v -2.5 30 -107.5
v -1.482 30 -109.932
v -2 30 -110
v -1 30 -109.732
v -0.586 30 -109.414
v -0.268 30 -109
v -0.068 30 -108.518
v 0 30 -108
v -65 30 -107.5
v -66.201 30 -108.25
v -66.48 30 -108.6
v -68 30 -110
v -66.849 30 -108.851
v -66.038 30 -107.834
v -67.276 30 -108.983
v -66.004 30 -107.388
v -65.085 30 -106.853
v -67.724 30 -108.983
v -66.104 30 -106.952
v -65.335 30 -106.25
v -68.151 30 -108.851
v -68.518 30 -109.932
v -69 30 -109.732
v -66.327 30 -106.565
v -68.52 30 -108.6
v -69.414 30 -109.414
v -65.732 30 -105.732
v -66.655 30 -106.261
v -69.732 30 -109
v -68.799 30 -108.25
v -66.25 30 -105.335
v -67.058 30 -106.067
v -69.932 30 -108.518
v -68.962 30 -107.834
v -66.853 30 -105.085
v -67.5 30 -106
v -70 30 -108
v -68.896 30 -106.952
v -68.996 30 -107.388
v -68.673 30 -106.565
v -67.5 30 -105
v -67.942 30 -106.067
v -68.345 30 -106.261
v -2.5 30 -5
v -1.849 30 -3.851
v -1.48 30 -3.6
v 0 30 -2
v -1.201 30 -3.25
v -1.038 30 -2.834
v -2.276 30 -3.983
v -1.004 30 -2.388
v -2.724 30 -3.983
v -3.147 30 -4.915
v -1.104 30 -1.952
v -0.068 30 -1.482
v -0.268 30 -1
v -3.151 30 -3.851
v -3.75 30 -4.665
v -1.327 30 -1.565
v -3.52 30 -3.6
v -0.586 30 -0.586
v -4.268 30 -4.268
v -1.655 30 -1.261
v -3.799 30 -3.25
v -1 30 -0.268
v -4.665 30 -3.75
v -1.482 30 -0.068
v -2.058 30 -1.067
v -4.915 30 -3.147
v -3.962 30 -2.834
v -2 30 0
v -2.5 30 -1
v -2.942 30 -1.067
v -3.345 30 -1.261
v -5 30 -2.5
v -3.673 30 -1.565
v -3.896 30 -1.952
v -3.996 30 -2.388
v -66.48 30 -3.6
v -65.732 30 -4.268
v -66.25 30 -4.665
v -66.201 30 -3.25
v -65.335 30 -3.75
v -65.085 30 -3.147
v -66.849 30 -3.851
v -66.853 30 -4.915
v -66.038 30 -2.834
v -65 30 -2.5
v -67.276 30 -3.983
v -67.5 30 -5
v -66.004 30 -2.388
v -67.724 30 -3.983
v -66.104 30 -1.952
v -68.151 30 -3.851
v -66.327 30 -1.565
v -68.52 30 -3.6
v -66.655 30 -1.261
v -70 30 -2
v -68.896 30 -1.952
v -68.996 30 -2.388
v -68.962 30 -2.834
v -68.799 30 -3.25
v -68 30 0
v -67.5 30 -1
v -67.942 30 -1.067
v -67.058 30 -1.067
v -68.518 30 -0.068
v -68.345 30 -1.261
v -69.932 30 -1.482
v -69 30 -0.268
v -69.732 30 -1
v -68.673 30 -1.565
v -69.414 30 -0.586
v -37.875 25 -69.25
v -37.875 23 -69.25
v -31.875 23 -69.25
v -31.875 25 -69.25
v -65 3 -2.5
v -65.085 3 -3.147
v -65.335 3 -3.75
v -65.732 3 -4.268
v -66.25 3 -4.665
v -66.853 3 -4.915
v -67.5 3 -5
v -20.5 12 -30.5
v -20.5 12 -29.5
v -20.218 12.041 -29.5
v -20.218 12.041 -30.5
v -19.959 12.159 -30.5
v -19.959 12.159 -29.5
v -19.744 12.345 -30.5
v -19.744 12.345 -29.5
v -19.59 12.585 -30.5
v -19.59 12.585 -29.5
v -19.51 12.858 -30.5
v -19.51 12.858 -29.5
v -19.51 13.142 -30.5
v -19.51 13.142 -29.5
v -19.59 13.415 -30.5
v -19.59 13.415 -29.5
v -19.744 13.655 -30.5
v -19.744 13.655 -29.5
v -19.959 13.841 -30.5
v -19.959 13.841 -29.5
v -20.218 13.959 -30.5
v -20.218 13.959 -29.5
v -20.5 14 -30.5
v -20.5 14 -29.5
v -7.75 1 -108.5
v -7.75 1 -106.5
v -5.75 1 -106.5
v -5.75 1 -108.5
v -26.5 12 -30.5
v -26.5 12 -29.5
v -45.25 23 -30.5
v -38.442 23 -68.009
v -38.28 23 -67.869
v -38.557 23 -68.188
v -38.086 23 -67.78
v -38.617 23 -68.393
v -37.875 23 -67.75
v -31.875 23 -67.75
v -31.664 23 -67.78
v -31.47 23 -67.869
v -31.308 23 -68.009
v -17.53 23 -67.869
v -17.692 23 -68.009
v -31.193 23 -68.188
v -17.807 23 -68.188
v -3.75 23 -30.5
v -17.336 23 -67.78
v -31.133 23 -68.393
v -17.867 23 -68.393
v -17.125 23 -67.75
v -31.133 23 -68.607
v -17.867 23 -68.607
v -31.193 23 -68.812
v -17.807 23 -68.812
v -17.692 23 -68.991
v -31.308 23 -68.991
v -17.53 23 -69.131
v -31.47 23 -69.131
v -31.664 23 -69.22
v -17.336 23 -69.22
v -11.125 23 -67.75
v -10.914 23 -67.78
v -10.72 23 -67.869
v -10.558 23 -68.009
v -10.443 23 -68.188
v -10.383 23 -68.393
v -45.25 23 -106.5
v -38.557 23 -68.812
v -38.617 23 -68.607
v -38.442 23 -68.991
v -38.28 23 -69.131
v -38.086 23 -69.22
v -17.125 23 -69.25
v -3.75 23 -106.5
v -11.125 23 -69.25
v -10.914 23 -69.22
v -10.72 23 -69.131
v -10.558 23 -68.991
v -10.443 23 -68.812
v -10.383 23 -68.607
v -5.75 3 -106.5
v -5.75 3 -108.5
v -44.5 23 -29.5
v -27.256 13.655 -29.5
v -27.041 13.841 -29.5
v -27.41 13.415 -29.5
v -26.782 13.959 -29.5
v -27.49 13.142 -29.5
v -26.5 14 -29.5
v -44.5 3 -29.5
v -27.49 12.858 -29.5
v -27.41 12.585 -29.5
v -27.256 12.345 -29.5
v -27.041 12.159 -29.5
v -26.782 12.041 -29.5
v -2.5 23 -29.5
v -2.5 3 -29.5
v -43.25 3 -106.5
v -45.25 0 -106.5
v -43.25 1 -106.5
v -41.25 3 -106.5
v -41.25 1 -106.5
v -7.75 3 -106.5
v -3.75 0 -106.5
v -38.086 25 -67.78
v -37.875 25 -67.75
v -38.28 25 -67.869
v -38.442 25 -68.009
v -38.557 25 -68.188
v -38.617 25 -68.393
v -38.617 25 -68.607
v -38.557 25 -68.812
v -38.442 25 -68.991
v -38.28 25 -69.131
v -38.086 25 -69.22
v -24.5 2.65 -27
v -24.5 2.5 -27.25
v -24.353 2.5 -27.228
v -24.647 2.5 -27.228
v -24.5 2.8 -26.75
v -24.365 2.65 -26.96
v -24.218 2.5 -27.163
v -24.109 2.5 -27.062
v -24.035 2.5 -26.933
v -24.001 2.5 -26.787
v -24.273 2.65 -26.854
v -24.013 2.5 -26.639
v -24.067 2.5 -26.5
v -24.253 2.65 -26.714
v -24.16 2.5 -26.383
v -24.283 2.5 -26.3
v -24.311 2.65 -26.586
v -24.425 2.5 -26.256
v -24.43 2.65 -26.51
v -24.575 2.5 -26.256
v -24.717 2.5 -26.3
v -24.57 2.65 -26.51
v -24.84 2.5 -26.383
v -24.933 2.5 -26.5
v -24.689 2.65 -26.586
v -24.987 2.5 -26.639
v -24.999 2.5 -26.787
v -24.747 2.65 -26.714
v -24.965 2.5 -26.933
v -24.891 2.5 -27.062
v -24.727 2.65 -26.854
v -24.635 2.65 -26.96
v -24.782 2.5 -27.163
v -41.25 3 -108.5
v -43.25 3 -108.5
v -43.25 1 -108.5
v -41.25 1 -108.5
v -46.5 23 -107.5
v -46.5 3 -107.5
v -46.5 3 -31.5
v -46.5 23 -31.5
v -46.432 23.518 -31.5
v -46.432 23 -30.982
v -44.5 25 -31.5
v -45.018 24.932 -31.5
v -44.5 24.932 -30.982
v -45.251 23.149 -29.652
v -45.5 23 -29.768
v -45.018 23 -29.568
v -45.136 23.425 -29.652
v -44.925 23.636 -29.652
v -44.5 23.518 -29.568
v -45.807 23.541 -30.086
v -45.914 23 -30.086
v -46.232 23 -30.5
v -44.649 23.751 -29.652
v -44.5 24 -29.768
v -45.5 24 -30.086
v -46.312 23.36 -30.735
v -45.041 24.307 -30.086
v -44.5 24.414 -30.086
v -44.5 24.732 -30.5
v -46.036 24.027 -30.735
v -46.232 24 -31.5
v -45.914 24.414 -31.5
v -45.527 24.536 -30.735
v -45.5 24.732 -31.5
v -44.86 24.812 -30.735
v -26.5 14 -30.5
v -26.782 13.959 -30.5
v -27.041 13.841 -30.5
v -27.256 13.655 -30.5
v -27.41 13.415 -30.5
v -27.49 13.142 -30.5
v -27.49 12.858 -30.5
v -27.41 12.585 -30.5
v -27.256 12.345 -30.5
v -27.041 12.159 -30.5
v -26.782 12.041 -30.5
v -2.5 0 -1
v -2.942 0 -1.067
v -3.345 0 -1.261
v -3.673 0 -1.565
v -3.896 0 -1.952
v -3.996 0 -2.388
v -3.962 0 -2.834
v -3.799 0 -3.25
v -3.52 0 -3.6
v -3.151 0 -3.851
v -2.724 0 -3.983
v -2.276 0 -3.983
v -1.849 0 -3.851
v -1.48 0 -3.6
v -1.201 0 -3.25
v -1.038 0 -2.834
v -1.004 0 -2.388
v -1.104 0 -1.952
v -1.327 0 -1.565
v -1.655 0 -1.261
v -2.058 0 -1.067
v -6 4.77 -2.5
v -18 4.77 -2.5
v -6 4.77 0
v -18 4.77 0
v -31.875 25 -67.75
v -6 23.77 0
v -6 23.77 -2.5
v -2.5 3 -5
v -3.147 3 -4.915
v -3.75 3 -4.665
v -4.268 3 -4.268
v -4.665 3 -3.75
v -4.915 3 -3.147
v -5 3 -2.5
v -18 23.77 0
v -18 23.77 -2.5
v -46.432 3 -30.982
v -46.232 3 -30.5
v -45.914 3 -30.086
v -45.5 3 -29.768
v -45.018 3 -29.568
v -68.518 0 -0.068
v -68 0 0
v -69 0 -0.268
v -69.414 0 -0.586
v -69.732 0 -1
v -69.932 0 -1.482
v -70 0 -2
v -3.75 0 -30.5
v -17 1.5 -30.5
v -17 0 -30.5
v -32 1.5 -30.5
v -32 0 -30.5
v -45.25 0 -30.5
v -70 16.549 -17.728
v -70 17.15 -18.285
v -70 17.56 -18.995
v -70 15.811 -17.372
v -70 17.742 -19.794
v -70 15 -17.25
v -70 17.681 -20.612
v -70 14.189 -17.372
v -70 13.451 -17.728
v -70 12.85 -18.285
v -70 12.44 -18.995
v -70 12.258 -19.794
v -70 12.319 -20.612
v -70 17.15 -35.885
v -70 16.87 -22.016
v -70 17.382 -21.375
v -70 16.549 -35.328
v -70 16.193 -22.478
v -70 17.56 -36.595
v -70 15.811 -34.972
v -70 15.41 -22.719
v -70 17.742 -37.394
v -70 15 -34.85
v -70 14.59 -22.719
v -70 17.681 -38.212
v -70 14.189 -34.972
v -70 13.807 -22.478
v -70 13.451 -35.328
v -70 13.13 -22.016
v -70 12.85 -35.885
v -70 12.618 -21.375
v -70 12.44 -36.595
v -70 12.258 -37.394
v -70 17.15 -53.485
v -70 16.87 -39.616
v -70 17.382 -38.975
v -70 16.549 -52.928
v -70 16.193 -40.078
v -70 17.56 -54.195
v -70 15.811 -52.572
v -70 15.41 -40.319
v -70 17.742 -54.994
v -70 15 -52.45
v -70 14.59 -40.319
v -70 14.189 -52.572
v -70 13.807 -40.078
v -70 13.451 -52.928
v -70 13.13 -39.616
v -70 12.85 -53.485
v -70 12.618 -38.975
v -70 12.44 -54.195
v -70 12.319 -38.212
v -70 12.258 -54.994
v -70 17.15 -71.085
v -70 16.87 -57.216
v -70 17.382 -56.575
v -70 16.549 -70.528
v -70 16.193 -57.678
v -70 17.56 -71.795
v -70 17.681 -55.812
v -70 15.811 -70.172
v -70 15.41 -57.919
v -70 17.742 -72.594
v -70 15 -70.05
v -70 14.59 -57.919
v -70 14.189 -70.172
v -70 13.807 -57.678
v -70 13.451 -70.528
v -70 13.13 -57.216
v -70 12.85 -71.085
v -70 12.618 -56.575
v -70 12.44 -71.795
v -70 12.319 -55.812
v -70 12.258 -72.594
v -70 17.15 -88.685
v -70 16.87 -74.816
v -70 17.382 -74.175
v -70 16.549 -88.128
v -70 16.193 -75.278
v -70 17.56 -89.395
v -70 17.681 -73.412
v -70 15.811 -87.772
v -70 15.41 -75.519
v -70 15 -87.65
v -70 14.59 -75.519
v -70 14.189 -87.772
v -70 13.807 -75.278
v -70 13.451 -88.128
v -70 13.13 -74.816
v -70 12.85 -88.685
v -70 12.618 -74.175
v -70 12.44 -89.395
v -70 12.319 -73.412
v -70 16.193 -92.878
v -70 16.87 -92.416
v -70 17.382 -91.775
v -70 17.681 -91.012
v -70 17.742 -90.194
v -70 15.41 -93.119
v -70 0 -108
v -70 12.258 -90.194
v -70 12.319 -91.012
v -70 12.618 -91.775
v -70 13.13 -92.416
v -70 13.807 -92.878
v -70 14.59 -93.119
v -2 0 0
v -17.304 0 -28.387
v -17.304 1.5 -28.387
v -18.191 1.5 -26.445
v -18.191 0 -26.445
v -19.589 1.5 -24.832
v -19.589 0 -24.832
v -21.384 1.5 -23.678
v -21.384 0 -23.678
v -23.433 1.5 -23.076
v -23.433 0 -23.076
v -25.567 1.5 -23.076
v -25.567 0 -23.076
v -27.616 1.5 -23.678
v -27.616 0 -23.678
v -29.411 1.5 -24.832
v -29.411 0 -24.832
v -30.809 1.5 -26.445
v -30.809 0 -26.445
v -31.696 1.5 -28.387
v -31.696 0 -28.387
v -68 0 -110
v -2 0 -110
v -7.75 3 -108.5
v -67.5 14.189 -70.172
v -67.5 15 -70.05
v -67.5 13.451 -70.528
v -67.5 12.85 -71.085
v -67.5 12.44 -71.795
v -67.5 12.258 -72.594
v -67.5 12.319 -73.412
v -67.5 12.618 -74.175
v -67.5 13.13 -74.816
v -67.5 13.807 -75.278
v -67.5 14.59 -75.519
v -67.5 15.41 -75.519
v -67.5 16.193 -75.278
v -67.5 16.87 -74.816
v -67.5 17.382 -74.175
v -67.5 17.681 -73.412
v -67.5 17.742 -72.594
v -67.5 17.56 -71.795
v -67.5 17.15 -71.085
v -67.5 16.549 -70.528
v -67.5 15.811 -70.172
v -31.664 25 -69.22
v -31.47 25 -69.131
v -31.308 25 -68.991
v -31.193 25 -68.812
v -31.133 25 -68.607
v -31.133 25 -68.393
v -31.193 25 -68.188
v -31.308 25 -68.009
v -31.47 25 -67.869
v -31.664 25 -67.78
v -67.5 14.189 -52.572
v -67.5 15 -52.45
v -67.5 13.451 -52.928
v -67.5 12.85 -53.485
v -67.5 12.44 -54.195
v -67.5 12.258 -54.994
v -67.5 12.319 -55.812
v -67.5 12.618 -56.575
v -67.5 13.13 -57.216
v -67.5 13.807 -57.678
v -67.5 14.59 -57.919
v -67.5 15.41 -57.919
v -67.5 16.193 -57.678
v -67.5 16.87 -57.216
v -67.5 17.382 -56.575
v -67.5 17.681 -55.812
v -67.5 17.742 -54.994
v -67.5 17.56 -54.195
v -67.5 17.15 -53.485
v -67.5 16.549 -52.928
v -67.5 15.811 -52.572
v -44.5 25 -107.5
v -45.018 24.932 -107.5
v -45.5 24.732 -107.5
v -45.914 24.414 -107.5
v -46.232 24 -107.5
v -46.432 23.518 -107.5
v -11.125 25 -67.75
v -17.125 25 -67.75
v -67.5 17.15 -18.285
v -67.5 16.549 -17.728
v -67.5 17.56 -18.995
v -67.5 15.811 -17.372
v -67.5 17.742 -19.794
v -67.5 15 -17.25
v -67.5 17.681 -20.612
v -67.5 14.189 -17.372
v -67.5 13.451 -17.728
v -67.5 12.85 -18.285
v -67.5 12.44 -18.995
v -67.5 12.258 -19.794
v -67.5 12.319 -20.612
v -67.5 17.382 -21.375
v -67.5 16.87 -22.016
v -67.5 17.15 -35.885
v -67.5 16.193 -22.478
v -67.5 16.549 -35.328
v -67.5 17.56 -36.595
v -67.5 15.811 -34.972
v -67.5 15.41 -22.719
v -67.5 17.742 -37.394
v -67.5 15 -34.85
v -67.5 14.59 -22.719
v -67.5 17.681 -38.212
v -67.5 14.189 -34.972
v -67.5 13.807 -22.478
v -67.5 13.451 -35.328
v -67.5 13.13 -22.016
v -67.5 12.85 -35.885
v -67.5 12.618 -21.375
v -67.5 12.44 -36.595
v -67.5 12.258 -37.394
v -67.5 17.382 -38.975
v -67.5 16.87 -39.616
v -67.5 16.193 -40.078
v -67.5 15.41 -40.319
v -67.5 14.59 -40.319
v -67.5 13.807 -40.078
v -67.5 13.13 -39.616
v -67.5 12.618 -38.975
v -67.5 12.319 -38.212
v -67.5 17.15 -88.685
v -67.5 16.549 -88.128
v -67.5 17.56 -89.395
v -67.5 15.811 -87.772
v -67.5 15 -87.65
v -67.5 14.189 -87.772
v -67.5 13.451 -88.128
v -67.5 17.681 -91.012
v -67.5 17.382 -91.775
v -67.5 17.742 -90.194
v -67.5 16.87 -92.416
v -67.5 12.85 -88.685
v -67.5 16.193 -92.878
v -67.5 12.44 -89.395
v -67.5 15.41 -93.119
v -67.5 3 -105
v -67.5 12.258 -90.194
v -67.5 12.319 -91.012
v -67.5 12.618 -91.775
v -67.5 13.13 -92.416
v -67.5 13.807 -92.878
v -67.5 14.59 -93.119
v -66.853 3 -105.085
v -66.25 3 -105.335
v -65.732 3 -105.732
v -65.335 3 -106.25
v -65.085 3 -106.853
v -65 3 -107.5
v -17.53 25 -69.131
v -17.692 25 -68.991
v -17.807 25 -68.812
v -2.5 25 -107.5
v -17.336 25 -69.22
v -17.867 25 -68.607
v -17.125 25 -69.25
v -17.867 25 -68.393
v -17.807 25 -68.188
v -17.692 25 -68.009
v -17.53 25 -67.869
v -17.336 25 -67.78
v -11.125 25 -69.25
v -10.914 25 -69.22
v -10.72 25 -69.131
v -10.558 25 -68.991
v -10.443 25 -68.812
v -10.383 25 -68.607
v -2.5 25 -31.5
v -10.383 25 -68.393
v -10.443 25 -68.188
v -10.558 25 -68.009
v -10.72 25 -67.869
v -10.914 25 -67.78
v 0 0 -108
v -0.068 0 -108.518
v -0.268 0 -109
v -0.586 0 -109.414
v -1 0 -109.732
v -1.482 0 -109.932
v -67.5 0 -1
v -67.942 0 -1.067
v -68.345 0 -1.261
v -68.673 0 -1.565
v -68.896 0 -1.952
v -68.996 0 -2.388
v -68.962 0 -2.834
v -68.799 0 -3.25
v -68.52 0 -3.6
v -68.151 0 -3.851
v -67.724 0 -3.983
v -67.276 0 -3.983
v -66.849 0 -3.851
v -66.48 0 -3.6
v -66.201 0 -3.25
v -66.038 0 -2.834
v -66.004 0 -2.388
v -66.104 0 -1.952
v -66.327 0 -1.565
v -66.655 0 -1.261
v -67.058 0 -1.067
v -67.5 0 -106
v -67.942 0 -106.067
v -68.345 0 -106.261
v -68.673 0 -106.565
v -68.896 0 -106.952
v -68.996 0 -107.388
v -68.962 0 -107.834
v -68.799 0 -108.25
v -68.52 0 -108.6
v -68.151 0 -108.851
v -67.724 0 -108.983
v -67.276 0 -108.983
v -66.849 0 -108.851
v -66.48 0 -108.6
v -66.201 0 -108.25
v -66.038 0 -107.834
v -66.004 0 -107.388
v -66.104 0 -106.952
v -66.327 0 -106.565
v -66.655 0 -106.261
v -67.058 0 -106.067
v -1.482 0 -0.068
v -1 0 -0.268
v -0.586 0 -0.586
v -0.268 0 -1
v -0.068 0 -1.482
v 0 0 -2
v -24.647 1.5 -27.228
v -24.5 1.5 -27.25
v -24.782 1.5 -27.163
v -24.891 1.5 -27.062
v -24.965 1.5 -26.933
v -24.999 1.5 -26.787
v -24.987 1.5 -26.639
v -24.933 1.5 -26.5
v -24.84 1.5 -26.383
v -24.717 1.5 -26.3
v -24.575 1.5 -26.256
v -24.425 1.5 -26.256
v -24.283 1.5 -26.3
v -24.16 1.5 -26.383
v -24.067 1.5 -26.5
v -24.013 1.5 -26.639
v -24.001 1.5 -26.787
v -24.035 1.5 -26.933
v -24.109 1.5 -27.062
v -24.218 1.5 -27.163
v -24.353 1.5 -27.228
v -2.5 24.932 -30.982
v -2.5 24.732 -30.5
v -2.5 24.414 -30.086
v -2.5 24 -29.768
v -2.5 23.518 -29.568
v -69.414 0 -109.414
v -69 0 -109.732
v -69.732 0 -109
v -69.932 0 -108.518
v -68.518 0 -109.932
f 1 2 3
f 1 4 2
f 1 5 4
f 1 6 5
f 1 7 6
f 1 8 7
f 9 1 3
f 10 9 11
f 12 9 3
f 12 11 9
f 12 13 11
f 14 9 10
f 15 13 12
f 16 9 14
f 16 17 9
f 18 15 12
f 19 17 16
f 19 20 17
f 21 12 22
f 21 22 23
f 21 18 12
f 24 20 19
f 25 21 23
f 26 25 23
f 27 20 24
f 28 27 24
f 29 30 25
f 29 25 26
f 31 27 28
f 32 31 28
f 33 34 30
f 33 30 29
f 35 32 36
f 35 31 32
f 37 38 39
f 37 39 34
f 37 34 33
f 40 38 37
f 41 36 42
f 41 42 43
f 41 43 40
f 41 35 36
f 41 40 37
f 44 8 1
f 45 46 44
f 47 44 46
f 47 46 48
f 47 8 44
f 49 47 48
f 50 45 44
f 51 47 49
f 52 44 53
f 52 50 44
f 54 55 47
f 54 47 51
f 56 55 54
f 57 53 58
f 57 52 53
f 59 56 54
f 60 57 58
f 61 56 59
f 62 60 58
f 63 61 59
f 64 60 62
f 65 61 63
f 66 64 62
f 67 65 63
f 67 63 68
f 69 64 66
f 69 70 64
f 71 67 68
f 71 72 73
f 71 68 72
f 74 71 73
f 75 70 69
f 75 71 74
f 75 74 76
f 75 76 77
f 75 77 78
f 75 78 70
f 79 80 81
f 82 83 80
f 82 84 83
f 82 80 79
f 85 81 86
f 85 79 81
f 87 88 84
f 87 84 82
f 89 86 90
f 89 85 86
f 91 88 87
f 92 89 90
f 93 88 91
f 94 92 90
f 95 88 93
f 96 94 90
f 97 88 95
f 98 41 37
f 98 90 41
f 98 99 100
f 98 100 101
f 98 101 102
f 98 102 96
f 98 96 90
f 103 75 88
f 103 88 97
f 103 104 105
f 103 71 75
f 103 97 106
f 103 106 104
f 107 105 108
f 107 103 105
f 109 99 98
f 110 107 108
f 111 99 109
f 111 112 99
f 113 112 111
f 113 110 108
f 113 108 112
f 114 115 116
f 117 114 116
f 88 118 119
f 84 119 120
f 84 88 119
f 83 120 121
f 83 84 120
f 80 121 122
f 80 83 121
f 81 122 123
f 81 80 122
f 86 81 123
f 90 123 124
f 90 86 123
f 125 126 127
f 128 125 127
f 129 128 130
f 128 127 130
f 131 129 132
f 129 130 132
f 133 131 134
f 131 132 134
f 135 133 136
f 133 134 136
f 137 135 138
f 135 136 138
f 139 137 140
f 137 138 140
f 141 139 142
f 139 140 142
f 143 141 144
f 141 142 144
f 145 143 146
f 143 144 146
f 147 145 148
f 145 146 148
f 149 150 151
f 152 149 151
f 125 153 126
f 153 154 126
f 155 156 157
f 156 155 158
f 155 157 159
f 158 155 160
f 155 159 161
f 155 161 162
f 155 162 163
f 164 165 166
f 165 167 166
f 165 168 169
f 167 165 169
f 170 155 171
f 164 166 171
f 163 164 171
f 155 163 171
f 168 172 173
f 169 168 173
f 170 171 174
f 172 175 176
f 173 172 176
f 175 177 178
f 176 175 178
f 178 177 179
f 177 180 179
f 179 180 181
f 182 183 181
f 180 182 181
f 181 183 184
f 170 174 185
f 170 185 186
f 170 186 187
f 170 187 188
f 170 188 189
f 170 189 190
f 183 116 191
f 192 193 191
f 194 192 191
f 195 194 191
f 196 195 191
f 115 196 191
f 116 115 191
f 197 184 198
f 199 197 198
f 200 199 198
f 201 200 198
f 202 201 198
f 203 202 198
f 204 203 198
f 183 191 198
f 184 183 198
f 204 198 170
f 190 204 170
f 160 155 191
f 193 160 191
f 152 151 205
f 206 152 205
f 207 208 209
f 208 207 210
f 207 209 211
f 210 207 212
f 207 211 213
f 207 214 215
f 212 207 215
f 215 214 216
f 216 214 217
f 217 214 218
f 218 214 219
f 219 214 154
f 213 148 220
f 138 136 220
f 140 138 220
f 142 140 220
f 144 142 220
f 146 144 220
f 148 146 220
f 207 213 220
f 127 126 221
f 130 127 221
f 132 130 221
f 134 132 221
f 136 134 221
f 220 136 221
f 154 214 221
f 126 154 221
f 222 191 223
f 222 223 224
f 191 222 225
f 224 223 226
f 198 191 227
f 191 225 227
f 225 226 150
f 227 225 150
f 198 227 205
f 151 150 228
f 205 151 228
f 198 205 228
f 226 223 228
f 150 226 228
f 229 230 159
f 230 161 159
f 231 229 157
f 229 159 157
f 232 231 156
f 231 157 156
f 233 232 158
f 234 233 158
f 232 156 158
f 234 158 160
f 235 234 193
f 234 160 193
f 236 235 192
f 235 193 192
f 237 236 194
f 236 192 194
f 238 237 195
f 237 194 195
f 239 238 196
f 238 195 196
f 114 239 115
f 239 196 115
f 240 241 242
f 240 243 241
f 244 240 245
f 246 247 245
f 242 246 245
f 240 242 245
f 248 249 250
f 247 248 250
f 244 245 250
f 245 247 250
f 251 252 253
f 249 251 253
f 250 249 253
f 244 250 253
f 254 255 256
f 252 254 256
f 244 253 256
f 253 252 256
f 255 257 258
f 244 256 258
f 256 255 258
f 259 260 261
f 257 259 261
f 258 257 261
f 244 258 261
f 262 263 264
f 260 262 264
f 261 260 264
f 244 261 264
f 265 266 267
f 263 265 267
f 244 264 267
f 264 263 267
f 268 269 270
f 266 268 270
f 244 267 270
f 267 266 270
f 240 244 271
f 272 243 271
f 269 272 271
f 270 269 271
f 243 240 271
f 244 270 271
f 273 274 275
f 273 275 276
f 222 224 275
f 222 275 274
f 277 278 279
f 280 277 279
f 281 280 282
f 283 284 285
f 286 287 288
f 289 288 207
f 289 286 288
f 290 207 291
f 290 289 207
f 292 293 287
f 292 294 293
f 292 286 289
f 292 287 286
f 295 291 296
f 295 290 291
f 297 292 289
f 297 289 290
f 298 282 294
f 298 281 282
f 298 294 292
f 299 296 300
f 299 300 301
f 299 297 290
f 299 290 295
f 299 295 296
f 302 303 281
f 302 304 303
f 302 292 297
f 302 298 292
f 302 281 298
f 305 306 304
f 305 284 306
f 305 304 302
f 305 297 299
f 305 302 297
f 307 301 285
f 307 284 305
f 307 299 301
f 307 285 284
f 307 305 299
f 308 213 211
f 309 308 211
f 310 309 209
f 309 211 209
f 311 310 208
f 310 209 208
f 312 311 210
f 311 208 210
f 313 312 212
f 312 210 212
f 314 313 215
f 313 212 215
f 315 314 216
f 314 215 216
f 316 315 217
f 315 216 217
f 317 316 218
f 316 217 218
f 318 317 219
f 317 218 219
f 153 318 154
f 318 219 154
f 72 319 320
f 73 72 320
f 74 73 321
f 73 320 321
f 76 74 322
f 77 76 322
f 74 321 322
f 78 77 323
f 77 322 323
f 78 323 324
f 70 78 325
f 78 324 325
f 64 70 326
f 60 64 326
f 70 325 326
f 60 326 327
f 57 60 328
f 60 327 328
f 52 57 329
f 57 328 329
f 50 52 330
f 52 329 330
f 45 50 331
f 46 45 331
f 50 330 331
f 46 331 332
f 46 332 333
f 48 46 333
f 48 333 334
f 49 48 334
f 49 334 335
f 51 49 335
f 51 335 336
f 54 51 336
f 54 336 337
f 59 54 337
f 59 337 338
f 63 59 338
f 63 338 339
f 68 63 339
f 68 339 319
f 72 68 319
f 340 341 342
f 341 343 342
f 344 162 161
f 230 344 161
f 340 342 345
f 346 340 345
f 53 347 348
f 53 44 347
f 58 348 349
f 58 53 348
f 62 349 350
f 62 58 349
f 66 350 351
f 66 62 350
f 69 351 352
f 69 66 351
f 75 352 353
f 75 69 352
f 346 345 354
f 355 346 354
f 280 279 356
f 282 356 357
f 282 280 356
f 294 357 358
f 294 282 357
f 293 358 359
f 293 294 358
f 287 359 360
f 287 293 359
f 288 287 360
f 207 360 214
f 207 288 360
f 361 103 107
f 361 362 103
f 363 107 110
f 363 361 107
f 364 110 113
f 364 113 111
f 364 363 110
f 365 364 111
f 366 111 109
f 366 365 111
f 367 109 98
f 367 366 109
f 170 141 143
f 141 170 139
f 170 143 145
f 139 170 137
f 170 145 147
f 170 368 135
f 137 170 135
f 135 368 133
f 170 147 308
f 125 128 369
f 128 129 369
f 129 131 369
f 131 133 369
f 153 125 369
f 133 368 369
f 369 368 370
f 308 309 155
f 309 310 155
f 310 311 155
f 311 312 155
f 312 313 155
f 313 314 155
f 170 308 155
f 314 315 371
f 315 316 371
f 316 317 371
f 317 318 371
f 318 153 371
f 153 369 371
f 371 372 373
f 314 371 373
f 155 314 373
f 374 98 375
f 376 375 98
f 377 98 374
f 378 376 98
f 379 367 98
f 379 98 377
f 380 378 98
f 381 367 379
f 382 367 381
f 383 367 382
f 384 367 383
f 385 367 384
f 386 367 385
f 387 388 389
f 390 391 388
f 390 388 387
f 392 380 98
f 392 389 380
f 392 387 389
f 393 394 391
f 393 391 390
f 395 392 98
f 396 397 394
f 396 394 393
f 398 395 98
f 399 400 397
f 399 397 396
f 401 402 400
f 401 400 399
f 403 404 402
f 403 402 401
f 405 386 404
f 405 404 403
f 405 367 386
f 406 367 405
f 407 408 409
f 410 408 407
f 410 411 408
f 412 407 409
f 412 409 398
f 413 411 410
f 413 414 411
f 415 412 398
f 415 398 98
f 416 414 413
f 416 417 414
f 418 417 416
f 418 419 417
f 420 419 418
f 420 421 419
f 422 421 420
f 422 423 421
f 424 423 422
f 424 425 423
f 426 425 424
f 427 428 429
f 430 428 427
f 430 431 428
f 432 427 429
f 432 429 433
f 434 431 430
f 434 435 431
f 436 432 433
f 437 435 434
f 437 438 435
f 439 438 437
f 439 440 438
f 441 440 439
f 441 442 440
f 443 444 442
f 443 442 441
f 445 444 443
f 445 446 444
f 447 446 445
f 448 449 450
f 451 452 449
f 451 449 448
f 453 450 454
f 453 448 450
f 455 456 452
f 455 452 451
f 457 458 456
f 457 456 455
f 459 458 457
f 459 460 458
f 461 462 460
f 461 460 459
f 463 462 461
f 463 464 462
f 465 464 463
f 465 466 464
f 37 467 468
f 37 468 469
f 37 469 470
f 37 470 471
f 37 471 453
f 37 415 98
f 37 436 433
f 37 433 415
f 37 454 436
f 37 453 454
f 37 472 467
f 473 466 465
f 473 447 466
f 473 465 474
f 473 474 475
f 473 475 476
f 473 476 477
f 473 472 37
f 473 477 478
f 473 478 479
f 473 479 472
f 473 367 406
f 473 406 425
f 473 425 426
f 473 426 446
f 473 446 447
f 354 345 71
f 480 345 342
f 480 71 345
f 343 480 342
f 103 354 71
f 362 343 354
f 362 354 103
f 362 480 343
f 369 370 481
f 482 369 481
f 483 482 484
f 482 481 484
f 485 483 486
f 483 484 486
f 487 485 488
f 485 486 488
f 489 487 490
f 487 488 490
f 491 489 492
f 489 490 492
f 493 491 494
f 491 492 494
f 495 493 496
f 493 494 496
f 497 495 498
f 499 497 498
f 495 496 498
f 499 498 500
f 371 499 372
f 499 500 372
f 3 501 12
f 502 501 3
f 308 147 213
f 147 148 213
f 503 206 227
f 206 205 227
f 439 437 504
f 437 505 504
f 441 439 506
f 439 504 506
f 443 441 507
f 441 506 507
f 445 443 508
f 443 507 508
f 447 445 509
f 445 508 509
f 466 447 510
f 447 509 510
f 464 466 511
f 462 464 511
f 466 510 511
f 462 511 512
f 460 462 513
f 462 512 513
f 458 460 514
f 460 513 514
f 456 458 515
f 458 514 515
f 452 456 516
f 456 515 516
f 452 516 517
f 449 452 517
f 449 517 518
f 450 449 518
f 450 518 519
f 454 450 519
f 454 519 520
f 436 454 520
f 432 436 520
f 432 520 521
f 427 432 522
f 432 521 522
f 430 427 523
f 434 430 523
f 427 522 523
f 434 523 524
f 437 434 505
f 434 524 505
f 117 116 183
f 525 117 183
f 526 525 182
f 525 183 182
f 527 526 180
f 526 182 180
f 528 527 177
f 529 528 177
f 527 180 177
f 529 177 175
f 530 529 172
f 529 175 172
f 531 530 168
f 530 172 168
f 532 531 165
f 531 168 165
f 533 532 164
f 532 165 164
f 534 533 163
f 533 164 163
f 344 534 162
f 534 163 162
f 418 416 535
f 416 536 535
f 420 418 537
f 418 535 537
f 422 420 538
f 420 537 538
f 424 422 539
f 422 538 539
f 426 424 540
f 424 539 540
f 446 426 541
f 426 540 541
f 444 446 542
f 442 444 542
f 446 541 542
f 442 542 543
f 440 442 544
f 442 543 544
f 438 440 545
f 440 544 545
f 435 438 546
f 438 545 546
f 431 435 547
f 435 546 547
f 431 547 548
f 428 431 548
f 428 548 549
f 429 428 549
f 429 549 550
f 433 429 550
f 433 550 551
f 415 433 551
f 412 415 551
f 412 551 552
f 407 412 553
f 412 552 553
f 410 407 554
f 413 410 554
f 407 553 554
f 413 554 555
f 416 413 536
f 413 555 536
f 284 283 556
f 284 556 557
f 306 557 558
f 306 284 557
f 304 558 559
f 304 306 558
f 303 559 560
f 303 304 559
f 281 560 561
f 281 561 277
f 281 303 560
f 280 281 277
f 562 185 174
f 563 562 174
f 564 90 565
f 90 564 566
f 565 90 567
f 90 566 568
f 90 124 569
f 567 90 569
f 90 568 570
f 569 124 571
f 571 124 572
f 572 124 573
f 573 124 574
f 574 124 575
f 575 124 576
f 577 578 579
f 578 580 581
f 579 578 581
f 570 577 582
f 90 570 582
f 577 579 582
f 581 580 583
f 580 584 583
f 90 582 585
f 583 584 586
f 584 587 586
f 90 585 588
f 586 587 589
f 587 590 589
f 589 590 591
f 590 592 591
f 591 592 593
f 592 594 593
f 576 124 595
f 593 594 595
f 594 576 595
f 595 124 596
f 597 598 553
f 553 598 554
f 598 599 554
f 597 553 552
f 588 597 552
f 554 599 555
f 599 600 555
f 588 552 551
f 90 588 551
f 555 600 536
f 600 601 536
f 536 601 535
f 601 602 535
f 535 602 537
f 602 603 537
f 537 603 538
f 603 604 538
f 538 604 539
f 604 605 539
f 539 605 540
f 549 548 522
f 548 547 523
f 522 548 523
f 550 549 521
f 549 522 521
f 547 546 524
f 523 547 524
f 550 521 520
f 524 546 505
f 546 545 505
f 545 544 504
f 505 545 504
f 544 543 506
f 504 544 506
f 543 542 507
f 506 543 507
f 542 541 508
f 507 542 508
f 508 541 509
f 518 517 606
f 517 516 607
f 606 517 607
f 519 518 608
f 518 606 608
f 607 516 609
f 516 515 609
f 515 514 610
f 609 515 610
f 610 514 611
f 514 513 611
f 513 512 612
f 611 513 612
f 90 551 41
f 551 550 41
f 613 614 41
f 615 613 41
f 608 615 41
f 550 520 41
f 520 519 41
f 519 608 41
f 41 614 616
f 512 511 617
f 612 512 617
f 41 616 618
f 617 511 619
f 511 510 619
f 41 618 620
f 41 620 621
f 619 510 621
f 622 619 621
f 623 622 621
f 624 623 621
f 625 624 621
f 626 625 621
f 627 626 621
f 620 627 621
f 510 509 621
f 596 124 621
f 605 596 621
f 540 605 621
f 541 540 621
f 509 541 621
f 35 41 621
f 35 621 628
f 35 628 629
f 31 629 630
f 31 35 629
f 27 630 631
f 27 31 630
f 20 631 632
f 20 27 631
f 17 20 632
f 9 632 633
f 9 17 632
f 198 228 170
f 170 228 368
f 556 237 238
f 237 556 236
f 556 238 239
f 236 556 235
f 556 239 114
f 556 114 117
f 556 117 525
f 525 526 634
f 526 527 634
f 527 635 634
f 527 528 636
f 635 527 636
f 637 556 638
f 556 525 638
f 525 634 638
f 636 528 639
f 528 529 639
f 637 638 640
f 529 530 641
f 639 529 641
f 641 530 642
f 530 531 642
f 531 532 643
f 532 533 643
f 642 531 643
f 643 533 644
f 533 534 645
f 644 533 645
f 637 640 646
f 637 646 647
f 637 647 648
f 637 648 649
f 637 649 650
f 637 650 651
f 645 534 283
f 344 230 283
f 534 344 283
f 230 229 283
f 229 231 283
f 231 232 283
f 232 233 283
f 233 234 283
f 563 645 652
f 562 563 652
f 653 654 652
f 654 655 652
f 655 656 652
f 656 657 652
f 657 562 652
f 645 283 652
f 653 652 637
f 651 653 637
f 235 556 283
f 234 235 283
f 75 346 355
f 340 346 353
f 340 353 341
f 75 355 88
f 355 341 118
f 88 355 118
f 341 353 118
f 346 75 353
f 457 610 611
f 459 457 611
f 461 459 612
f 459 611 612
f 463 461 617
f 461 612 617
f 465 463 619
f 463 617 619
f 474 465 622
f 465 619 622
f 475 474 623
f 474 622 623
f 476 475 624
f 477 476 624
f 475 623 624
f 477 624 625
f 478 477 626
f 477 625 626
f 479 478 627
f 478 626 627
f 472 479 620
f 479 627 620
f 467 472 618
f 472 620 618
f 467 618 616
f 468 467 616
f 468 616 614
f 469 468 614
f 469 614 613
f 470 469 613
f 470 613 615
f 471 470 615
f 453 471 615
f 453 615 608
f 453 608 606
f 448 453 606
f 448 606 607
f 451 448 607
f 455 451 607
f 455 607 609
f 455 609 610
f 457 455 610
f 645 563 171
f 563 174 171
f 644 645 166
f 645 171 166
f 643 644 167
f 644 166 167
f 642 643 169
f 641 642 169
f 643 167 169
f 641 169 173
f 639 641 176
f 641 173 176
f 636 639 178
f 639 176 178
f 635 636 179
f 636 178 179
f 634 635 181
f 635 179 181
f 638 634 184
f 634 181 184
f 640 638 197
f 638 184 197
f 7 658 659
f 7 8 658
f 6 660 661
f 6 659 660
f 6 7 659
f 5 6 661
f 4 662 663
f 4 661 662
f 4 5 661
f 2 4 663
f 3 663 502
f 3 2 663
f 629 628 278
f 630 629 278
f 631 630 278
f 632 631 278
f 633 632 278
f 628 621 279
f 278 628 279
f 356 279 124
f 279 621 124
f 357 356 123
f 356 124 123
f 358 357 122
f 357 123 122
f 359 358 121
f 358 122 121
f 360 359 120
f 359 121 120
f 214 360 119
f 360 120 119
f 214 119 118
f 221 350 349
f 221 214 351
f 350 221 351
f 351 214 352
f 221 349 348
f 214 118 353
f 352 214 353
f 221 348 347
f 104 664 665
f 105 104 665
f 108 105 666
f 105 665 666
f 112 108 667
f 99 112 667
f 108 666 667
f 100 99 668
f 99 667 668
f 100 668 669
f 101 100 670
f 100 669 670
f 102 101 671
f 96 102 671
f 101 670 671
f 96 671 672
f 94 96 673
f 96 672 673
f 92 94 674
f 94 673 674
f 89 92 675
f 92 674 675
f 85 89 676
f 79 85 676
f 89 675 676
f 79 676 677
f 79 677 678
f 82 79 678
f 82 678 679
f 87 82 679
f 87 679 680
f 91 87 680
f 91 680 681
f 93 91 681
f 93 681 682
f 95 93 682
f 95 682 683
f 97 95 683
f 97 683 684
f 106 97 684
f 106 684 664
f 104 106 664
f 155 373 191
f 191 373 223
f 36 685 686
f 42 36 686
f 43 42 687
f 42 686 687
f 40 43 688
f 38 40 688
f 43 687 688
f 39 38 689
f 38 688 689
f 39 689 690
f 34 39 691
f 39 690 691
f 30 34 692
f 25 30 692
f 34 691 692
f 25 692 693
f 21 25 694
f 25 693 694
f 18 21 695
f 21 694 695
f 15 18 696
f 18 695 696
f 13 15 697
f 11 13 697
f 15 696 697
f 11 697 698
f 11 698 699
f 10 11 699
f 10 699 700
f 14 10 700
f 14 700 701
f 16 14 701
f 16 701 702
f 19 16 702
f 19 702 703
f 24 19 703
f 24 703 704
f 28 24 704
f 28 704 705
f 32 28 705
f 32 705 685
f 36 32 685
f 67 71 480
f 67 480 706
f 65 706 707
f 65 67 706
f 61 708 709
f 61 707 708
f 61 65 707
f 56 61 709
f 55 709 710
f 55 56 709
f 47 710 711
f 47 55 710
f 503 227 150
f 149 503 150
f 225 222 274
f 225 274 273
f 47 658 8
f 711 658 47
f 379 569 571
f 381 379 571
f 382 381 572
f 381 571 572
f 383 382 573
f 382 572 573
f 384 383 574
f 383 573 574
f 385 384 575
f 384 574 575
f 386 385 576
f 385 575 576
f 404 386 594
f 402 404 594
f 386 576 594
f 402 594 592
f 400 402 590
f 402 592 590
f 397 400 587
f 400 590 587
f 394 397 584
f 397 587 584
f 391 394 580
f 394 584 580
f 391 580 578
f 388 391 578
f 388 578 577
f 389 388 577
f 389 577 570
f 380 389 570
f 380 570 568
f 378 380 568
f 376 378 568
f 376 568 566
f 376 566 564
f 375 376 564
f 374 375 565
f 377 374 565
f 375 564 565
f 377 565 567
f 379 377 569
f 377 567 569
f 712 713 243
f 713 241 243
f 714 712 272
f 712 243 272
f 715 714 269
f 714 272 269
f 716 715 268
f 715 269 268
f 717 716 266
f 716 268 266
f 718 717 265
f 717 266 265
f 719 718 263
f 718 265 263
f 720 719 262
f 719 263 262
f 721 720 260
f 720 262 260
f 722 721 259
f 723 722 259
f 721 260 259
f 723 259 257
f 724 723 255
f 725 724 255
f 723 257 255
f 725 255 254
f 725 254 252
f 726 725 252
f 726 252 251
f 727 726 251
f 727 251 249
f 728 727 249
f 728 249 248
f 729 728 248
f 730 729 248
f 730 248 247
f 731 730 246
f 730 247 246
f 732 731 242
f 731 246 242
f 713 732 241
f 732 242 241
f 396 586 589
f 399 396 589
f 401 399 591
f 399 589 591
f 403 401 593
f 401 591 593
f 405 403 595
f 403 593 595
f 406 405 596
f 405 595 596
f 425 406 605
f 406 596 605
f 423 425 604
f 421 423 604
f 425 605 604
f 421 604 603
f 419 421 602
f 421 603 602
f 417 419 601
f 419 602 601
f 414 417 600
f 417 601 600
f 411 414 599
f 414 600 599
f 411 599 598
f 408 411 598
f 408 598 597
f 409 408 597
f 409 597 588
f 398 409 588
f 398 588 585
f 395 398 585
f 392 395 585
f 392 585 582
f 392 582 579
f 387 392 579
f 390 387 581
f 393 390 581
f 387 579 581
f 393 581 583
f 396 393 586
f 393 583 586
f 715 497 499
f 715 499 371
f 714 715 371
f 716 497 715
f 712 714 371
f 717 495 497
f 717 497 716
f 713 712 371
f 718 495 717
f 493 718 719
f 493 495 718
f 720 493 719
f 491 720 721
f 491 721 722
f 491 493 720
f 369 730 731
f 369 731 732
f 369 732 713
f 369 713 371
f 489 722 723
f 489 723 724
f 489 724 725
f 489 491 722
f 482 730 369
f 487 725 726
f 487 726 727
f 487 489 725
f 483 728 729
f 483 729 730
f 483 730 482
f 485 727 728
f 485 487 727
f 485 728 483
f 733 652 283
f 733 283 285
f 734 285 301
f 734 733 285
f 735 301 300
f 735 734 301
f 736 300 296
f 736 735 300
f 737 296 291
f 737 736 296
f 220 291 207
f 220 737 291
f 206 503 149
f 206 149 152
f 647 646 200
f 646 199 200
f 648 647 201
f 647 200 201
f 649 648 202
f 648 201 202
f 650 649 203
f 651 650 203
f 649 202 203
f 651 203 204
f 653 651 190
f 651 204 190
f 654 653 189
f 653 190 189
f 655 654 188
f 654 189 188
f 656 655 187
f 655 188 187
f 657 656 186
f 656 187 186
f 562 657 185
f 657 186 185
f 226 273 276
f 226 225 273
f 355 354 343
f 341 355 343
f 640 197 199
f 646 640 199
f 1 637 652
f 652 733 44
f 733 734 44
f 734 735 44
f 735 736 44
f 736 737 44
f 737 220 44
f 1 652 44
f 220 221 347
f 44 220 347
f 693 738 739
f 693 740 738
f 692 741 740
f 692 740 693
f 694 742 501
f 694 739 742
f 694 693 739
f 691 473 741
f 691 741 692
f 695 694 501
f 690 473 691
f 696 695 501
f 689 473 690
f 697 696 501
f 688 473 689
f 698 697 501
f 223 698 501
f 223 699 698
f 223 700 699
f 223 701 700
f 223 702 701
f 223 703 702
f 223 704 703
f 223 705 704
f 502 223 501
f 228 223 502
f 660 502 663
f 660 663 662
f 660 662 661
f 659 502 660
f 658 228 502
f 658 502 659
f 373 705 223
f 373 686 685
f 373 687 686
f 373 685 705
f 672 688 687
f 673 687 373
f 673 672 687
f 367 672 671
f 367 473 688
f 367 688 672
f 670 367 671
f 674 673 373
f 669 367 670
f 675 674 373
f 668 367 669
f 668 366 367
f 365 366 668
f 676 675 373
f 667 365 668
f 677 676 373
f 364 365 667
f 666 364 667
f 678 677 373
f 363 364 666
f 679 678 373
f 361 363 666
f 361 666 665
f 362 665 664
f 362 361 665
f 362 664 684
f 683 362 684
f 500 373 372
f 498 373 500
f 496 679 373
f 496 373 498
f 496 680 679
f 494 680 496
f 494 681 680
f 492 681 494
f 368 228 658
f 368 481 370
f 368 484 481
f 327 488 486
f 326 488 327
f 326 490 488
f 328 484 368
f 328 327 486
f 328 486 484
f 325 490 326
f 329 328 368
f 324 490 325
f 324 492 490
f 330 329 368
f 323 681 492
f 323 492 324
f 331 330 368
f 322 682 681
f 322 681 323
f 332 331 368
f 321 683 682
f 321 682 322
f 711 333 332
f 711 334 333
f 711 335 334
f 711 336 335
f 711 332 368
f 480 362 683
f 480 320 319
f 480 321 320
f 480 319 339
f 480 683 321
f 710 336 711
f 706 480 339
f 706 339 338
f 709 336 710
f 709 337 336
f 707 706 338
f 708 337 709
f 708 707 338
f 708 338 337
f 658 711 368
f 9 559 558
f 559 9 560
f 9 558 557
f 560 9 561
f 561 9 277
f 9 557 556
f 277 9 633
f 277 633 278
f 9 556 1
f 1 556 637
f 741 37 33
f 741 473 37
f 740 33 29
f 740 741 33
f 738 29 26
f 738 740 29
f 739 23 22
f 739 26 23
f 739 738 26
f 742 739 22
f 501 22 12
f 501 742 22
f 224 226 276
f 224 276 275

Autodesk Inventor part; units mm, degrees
ref_plane "YZ Plane" through (0, 0, 0) normal (1, 0, 0) x (0, 1, 0)
ref_plane "XZ Plane" through (0, 0, 0) normal (0, 1, 0) x (-1, 0, 0)
ref_plane "XY Plane" through (0, 0, 0) normal (0, 0, 1) x (1, 0, 0)
sketch "Sketch1" plane through (0, 0, 0) normal (0, 1, 0) x (-1, 0, 0)
  line L0 (0, 0) -> (70, 0)
  line L1 (70, 0) -> (70, -110)
  line L2 (70, -110) -> (0, -110)
  line L3 (0, -110) -> (0, 0)
  line L4 (2.5, -2.5) -> (67.5, -2.5)
  line L5 (67.5, -2.5) -> (67.5, -107.5)
  line L6 (67.5, -107.5) -> (2.5, -107.5)
  line L7 (2.5, -107.5) -> (2.5, -2.5)
  line L8 (2.5, -2.5) -> (67.5, -107.5) construction
  line L9 (67.5, -2.5) -> (2.5, -107.5) construction
  point P0 (35, -55)
  dimension "d0" = 70
  dimension "d1" = 110
  dimension "d2" = 65
  dimension "d3" = 105
extrude "Extrusion1" add sketch "Sketch1" along normal blind 30
sketch "Sketch2" plane through (0, 0, 0) normal (0, -1, 0) x (1, 0, 0)
  line L0 (0, -110) -> (-70, -110) projected
  line L1 (0, 0) -> (-70, 0)
  line L2 (-70, 0) -> (-70, -110)
  line L3 (-70, -110) -> (0, -110)
  line L4 (0, -110) -> (0, 0)
extrude "Extrusion2" add sketch "Sketch2" against normal blind 3
sketch "Sketch3" plane through (0, 0, 0) normal (0, -1, 0) x (1, 0, 0)
  line L0 (-2.5, -107.5) -> (-2.5, -2.5) projected
  line L1 (-2.5, -107.5) -> (-46.5, -107.5)
  line L2 (-46.5, -107.5) -> (-46.5, -29.5)
  line L3 (-46.5, -29.5) -> (-2.5, -29.5)
  line L4 (-2.5, -29.5) -> (-2.5, -107.5)
  line L5 (-45.25, -106.5) -> (-3.75, -106.5)
  line L6 (-3.75, -106.5) -> (-3.75, -30.5)
  line L7 (-3.75, -30.5) -> (-45.25, -30.5)
  line L8 (-45.25, -30.5) -> (-45.25, -106.5)
  line L9 (-45.25, -106.5) -> (-3.75, -30.5) construction
  line L10 (-3.75, -106.5) -> (-45.25, -30.5) construction
  point P0 (0, 0)
  point P1 (-24.5, -68.5)
  dimension "d8" = 44
  dimension "d9" = 78
  dimension "d10" = 41.5
  dimension "d11" = 76
extrude "Extrusion3" add sketch "Sketch3" against normal blind 25
extrude "Extrusion4" cut sketch "Sketch3" against normal blind 25 contours L8 L7 L6 L5
sketch "Sketch4" plane through (0, 25, 0) normal (0, 1, 0) x (1, 0, 0)
  line L0 (-46.5, 107.5) -> (-46.5, 29.5) projected
  line L1 (-2.5, 107.5) -> (-2.5, 29.5) projected
  line L2 (-46.5, 29.5) -> (-2.5, 29.5)
  line L3 (-2.5, 29.5) -> (-2.5, 107.5)
  line L4 (-2.5, 107.5) -> (-46.5, 107.5)
  line L5 (-46.5, 107.5) -> (-46.5, 29.5)
  point P0 (0, 0)
  point P1 (-2.5, 29.5)
extrude "Extrusion5" add sketch "Sketch4" against normal blind 2
fillet "Fillet1" radius 2 3 edges at (-46.5, 25, -68.5) (-46.5, 14, -29.5) (-24.5, 25, -29.5)
sketch "Sketch5" plane through (0, 23, 0) normal (0, -1, 0) x (1, 0, 0)
  line L0 (-45.25, -30.5) -> (-3.75, -30.5) construction
  line L1 (-3.75, -30.5) -> (-3.75, -106.5) construction
  line L2 (-45.25, -30.5) -> (-3.75, -106.5) construction
  line L3 (-3.75, -106.5) -> (-45.25, -106.5) construction
  line L4 (0, 0) -> (0, -110) construction
  line L5 (-45.25, -106.5) -> (-3.75, -30.5) construction
  line L6 (-24.5, -68.5) -> (-24.5, -106.5) construction
  line L7 (-3.75, -106.5) -> (-45.25, -106.5) construction
  line L8 (-24.5, -68.5) -> (-24.5, -30.5) construction
  line L9 (-45.25, -106.5) -> (-24.5, -30.5) construction
  line L10 (-45.25, -30.5) -> (-24.5, -106.5) construction
  line L11 (-24.5, -106.5) -> (-3.75, -30.5) construction
  line L12 (-24.5, -30.5) -> (-3.75, -106.5) construction
  line L13 (-31.875, -68.5) -> (-37.875, -68.5) construction
  line L14 (-31.875, -67.75) -> (-37.875, -67.75)
  line L15 (-37.875, -69.25) -> (-31.875, -69.25)
  arc A0 (-31.875, -69.25) -> (-31.875, -67.75) centre (-31.875, -68.5) ccw
  arc A1 (-37.875, -67.75) -> (-37.875, -69.25) centre (-37.875, -68.5) ccw
  line L16 (-11.125, -68.5) -> (-17.125, -68.5) construction
  line L17 (-11.125, -67.75) -> (-17.125, -67.75)
  line L18 (-17.125, -69.25) -> (-11.125, -69.25)
  arc A2 (-11.125, -69.25) -> (-11.125, -67.75) centre (-11.125, -68.5) ccw
  arc A3 (-17.125, -67.75) -> (-17.125, -69.25) centre (-17.125, -68.5) ccw
  point P0 (-34.875, -68.5)
  point P1 (-14.125, -68.5)
  dimension "d19" = 3
  dimension "d20" = 1.5
  dimension "d21" = 3
  dimension "d22" = 1.5
extrude "Extrusion6" cut sketch "Sketch5" against normal blind 2
sketch "Sketch6" plane through (-44.5, 23, -29.5) normal (0, 0, 1) x (1, 0, 0)
  line L0 (44.5, 7) -> (44.5, -23) projected
  line L1 (44.5, -23) -> (-25.5, -23) projected
  line L2 (-25.5, -23) -> (-25.5, 7) projected
  line L3 (-25.5, 7) -> (-23, 7) projected
  line L4 (-23, 7) -> (-23, -20) projected
  line L5 (-23, -20) -> (0, -20) projected
  line L6 (0, -20) -> (0, 0) projected
  line L7 (0, 0) -> (42, 0) projected
  line L8 (42, -20) -> (42, 0) projected
  line L9 (0, -20) -> (42, -20) projected
  line L10 (42, 7) -> (44.5, 7) projected
  line L11 (42, 0) -> (42, 7) projected
  line L12 (42, 0) -> (0, -20) construction
  line L13 (42, -20) -> (0, 0) construction
  line L14 (18, -10) -> (24, -10) construction
  line L15 (18, -11) -> (24, -11)
  line L16 (24, -9) -> (18, -9)
  arc A0 (18, -9) -> (18, -11) centre (18, -10) ccw
  arc A1 (24, -11) -> (24, -9) centre (24, -10) ccw
  point P0 (21, -10)
  dimension "d25" = 3
  dimension "d26" = 2
extrude "Extrusion7" cut sketch "Sketch6" against normal blind 2 contours A0 L16 A1 L15
sketch "Sketch7" plane through (0, 30, 0) normal (0, 1, 0) x (1, 0, 0)
  line L0 (-67.5, 107.5) -> (-46.5, 107.5) projected
  circle A0 centre (-67.5, 107.5) radius 2.5
  line L1 (0, 110) -> (-70, 110) projected
  line L2 (-2.5, 2.5) -> (-67.5, 2.5) projected
  circle A1 centre (-2.5, 2.5) radius 2.5
  line L3 (-70, 0) -> (0, 0) projected
  circle A2 centre (-67.5, 2.5) radius 2.5
extrude "Extrusion8" add sketch "Sketch7" against normal blind 30 contours A0 | A1 | A2
fillet "Fillet2" radius 2 3 edges at (0, 15, 0) (-70, 15, 0) (-70, 15, -110)
sketch "Sketch8" plane through (0, 30, 0) normal (0, 1, 0) x (1, 0, 0)
  arc A0 (-65, 2.5) -> (-67.5, 5) centre (-67.5, 2.5) ccw projected
  arc A1 (-2.5, 5) -> (-5, 2.5) centre (-2.5, 2.5) ccw projected
  arc A2 (-67.5, 105) -> (-65, 107.5) centre (-67.5, 107.5) ccw projected
  point P0 (0, 0)
hole "Hole1" at (-67.5, 30, -2.5) at (-2.5, 30, -2.5) at (-67.5, 30, -107.5) direction (0, -1, 0) diameter 3 depth 40 tip angle 118
fillet "Fillet3" radius 2 1 edges at (0, 15, -110)
sketch "Sketch9" plane through (-45.25, 0, -106.5) normal (0, 0, 1) x (1, 0, 0)
  line L0 (-24.75, 30) -> (-23.368, 30) projected
  line L1 (-23.368, 30) -> (-23.368, 0) projected
  line L2 (-23.368, 0) -> (-24.75, 0) projected
  line L3 (-24.75, 0) -> (-24.75, 30) projected
  line L4 (41.5, 23) -> (0, 23) projected
  line L5 (0, 23) -> (0, 0) projected
  line L6 (0, 0) -> (-21.132, 0) projected
  line L7 (-21.132, 0) -> (-21.132, 30) projected
  line L8 (-21.132, 30) -> (-19.9587, 30) projected
  line L9 (-19.9587, 30) -> (-19.9587, 3) projected
  line L10 (-19.9587, 3) -> (-1.25, 3) projected
  line L11 (-1.25, 3) -> (-1.25, 23) projected
  arc A0 (0.75, 25) -> (-1.25, 23) centre (0.75, 23) ccw projected
  line L12 (0.75, 25) -> (42.75, 25) projected
  line L13 (42.75, 25) -> (42.75, 30) projected
  line L14 (42.75, 30) -> (45.25, 30) projected
  line L15 (45.25, 30) -> (45.25, 0) projected
  line L16 (45.25, 0) -> (41.5, 0) projected
  line L17 (41.5, 0) -> (0, 0) projected
  line L18 (41.5, 0) -> (41.5, 23) projected
  line L19 (0, 3) -> (2, 3) construction
  line L20 (-19.75, 3) -> (-1.25, 3) construction
  line L21 (2, 3) -> (4, 3)
  line L22 (4, 3) -> (4, 1)
  line L23 (4, 1) -> (2, 1)
  line L24 (2, 1) -> (2, 3)
  line L25 (41.5, 3) -> (39.5, 3) construction
  line L26 (39.5, 3) -> (37.5, 3)
  line L27 (37.5, 3) -> (37.5, 1)
  line L28 (37.5, 1) -> (39.5, 1)
  line L29 (39.5, 1) -> (39.5, 3)
  dimension "d40" = 2
  dimension "d41" = 2
  dimension "d42" = 2
  dimension "d43" = 2
  dimension "d44" = 2
  dimension "d45" = 2
extrude "Extrusion9" cut sketch "Sketch9" against normal blind 2 contours L21 L22 L23 L24 | L29 L28 L27 L26
sketch "Sketch10" plane through (0, 0, 0) normal (0, -1, 0) x (1, 0, 0)
  line L0 (-45.25, -30.5) -> (-3.75, -30.5) projected
  circle A0 centre (-24.5, -30.5) radius 7.5
  point P0 (0, 0)
  point P1 (-17, -30.5)
  point P2 (-32, -30.5)
  dimension "d48" = 15
extrude "Extrusion10" cut sketch "Sketch10" against normal blind 1.5 contours A0 L0 picked at (-23.8998, -27.0007)
sketch "Sketch12" plane through (0, 1.5, 0) normal (0, -1, 0) x (1, 0, 0)
  arc A0 (-17, -30.5) -> (-32, -30.5) centre (-24.5, -30.5) ccw construction
  line L0 (-24.5, -30.5) -> (-24.5, -26.75) construction
  line L1 (-24.5, -30.5) -> (-20.75, -30.5) construction
  point P0 (0, 0)
  dimension "d58" = 3.75
  dimension "d59" = 90
hole "Hole3" at (-24.5, 1.5, -26.75) direction (0, 1, 0) diameter 1 depth 1 tip angle 118
sketch "Sketch14" plane through (-70, 0, -108) normal (-1, 0, 0) x (0, 0, 1)
  line L0 (0, 0) -> (0, 30) construction
  line L1 (108, 0) -> (106, 0) construction
  line L2 (106, 0) -> (106, 30) construction
  line L3 (108, 30) -> (108, 0) construction
  line L4 (53, 15) -> (106, 15) construction
  line L5 (106, 0) -> (106, 30) construction
  line L6 (53, 15) -> (0, 15) construction
  line L7 (0, 15) -> (17.6, 15) construction
  point P0 (35.2, 15)
  point P1 (52.8, 15)
  point P2 (70.4, 15)
  point P3 (88, 15)
  dimension "d71" = 17.6
  dimension "d74" = 17.6
  dimension "d79" = 18
hole "Hole4" at (-70, 15, -90.4) at (-70, 15, -72.8) at (-70, 15, -55.2) at (-70, 15, -37.6) at (-70, 15, -20) direction (1, 0, 0) diameter 5.5 depth 3
sketch "Sketch16" plane through (-68, 0, 0) normal (0, 0, 1) x (1, 0, 0)
  line L0 (0, 0) -> (66, 0) construction
  line L1 (66, 0) -> (62, 0) construction
  line L2 (66, 0) -> (70, 0) construction
  line L3 (62, 0) -> (62, 30) construction
  line L4 (0, 30) -> (66, 30) construction
  line L5 (62, 23.7699) -> (50, 23.7699)
  line L6 (50, 23.7699) -> (50, 4.7699)
  line L7 (50, 4.7699) -> (62, 4.7699)
  line L8 (62, 4.7699) -> (62, 23.7699)
  point P0 (68, 0)
  dimension "d88" = 4
  dimension "d89" = 180
  dimension "d90" = 12
  dimension "d91" = 19
extrude "Extrusion11" cut sketch "Sketch16" against normal blind 3
properties part number "inferior model2"
